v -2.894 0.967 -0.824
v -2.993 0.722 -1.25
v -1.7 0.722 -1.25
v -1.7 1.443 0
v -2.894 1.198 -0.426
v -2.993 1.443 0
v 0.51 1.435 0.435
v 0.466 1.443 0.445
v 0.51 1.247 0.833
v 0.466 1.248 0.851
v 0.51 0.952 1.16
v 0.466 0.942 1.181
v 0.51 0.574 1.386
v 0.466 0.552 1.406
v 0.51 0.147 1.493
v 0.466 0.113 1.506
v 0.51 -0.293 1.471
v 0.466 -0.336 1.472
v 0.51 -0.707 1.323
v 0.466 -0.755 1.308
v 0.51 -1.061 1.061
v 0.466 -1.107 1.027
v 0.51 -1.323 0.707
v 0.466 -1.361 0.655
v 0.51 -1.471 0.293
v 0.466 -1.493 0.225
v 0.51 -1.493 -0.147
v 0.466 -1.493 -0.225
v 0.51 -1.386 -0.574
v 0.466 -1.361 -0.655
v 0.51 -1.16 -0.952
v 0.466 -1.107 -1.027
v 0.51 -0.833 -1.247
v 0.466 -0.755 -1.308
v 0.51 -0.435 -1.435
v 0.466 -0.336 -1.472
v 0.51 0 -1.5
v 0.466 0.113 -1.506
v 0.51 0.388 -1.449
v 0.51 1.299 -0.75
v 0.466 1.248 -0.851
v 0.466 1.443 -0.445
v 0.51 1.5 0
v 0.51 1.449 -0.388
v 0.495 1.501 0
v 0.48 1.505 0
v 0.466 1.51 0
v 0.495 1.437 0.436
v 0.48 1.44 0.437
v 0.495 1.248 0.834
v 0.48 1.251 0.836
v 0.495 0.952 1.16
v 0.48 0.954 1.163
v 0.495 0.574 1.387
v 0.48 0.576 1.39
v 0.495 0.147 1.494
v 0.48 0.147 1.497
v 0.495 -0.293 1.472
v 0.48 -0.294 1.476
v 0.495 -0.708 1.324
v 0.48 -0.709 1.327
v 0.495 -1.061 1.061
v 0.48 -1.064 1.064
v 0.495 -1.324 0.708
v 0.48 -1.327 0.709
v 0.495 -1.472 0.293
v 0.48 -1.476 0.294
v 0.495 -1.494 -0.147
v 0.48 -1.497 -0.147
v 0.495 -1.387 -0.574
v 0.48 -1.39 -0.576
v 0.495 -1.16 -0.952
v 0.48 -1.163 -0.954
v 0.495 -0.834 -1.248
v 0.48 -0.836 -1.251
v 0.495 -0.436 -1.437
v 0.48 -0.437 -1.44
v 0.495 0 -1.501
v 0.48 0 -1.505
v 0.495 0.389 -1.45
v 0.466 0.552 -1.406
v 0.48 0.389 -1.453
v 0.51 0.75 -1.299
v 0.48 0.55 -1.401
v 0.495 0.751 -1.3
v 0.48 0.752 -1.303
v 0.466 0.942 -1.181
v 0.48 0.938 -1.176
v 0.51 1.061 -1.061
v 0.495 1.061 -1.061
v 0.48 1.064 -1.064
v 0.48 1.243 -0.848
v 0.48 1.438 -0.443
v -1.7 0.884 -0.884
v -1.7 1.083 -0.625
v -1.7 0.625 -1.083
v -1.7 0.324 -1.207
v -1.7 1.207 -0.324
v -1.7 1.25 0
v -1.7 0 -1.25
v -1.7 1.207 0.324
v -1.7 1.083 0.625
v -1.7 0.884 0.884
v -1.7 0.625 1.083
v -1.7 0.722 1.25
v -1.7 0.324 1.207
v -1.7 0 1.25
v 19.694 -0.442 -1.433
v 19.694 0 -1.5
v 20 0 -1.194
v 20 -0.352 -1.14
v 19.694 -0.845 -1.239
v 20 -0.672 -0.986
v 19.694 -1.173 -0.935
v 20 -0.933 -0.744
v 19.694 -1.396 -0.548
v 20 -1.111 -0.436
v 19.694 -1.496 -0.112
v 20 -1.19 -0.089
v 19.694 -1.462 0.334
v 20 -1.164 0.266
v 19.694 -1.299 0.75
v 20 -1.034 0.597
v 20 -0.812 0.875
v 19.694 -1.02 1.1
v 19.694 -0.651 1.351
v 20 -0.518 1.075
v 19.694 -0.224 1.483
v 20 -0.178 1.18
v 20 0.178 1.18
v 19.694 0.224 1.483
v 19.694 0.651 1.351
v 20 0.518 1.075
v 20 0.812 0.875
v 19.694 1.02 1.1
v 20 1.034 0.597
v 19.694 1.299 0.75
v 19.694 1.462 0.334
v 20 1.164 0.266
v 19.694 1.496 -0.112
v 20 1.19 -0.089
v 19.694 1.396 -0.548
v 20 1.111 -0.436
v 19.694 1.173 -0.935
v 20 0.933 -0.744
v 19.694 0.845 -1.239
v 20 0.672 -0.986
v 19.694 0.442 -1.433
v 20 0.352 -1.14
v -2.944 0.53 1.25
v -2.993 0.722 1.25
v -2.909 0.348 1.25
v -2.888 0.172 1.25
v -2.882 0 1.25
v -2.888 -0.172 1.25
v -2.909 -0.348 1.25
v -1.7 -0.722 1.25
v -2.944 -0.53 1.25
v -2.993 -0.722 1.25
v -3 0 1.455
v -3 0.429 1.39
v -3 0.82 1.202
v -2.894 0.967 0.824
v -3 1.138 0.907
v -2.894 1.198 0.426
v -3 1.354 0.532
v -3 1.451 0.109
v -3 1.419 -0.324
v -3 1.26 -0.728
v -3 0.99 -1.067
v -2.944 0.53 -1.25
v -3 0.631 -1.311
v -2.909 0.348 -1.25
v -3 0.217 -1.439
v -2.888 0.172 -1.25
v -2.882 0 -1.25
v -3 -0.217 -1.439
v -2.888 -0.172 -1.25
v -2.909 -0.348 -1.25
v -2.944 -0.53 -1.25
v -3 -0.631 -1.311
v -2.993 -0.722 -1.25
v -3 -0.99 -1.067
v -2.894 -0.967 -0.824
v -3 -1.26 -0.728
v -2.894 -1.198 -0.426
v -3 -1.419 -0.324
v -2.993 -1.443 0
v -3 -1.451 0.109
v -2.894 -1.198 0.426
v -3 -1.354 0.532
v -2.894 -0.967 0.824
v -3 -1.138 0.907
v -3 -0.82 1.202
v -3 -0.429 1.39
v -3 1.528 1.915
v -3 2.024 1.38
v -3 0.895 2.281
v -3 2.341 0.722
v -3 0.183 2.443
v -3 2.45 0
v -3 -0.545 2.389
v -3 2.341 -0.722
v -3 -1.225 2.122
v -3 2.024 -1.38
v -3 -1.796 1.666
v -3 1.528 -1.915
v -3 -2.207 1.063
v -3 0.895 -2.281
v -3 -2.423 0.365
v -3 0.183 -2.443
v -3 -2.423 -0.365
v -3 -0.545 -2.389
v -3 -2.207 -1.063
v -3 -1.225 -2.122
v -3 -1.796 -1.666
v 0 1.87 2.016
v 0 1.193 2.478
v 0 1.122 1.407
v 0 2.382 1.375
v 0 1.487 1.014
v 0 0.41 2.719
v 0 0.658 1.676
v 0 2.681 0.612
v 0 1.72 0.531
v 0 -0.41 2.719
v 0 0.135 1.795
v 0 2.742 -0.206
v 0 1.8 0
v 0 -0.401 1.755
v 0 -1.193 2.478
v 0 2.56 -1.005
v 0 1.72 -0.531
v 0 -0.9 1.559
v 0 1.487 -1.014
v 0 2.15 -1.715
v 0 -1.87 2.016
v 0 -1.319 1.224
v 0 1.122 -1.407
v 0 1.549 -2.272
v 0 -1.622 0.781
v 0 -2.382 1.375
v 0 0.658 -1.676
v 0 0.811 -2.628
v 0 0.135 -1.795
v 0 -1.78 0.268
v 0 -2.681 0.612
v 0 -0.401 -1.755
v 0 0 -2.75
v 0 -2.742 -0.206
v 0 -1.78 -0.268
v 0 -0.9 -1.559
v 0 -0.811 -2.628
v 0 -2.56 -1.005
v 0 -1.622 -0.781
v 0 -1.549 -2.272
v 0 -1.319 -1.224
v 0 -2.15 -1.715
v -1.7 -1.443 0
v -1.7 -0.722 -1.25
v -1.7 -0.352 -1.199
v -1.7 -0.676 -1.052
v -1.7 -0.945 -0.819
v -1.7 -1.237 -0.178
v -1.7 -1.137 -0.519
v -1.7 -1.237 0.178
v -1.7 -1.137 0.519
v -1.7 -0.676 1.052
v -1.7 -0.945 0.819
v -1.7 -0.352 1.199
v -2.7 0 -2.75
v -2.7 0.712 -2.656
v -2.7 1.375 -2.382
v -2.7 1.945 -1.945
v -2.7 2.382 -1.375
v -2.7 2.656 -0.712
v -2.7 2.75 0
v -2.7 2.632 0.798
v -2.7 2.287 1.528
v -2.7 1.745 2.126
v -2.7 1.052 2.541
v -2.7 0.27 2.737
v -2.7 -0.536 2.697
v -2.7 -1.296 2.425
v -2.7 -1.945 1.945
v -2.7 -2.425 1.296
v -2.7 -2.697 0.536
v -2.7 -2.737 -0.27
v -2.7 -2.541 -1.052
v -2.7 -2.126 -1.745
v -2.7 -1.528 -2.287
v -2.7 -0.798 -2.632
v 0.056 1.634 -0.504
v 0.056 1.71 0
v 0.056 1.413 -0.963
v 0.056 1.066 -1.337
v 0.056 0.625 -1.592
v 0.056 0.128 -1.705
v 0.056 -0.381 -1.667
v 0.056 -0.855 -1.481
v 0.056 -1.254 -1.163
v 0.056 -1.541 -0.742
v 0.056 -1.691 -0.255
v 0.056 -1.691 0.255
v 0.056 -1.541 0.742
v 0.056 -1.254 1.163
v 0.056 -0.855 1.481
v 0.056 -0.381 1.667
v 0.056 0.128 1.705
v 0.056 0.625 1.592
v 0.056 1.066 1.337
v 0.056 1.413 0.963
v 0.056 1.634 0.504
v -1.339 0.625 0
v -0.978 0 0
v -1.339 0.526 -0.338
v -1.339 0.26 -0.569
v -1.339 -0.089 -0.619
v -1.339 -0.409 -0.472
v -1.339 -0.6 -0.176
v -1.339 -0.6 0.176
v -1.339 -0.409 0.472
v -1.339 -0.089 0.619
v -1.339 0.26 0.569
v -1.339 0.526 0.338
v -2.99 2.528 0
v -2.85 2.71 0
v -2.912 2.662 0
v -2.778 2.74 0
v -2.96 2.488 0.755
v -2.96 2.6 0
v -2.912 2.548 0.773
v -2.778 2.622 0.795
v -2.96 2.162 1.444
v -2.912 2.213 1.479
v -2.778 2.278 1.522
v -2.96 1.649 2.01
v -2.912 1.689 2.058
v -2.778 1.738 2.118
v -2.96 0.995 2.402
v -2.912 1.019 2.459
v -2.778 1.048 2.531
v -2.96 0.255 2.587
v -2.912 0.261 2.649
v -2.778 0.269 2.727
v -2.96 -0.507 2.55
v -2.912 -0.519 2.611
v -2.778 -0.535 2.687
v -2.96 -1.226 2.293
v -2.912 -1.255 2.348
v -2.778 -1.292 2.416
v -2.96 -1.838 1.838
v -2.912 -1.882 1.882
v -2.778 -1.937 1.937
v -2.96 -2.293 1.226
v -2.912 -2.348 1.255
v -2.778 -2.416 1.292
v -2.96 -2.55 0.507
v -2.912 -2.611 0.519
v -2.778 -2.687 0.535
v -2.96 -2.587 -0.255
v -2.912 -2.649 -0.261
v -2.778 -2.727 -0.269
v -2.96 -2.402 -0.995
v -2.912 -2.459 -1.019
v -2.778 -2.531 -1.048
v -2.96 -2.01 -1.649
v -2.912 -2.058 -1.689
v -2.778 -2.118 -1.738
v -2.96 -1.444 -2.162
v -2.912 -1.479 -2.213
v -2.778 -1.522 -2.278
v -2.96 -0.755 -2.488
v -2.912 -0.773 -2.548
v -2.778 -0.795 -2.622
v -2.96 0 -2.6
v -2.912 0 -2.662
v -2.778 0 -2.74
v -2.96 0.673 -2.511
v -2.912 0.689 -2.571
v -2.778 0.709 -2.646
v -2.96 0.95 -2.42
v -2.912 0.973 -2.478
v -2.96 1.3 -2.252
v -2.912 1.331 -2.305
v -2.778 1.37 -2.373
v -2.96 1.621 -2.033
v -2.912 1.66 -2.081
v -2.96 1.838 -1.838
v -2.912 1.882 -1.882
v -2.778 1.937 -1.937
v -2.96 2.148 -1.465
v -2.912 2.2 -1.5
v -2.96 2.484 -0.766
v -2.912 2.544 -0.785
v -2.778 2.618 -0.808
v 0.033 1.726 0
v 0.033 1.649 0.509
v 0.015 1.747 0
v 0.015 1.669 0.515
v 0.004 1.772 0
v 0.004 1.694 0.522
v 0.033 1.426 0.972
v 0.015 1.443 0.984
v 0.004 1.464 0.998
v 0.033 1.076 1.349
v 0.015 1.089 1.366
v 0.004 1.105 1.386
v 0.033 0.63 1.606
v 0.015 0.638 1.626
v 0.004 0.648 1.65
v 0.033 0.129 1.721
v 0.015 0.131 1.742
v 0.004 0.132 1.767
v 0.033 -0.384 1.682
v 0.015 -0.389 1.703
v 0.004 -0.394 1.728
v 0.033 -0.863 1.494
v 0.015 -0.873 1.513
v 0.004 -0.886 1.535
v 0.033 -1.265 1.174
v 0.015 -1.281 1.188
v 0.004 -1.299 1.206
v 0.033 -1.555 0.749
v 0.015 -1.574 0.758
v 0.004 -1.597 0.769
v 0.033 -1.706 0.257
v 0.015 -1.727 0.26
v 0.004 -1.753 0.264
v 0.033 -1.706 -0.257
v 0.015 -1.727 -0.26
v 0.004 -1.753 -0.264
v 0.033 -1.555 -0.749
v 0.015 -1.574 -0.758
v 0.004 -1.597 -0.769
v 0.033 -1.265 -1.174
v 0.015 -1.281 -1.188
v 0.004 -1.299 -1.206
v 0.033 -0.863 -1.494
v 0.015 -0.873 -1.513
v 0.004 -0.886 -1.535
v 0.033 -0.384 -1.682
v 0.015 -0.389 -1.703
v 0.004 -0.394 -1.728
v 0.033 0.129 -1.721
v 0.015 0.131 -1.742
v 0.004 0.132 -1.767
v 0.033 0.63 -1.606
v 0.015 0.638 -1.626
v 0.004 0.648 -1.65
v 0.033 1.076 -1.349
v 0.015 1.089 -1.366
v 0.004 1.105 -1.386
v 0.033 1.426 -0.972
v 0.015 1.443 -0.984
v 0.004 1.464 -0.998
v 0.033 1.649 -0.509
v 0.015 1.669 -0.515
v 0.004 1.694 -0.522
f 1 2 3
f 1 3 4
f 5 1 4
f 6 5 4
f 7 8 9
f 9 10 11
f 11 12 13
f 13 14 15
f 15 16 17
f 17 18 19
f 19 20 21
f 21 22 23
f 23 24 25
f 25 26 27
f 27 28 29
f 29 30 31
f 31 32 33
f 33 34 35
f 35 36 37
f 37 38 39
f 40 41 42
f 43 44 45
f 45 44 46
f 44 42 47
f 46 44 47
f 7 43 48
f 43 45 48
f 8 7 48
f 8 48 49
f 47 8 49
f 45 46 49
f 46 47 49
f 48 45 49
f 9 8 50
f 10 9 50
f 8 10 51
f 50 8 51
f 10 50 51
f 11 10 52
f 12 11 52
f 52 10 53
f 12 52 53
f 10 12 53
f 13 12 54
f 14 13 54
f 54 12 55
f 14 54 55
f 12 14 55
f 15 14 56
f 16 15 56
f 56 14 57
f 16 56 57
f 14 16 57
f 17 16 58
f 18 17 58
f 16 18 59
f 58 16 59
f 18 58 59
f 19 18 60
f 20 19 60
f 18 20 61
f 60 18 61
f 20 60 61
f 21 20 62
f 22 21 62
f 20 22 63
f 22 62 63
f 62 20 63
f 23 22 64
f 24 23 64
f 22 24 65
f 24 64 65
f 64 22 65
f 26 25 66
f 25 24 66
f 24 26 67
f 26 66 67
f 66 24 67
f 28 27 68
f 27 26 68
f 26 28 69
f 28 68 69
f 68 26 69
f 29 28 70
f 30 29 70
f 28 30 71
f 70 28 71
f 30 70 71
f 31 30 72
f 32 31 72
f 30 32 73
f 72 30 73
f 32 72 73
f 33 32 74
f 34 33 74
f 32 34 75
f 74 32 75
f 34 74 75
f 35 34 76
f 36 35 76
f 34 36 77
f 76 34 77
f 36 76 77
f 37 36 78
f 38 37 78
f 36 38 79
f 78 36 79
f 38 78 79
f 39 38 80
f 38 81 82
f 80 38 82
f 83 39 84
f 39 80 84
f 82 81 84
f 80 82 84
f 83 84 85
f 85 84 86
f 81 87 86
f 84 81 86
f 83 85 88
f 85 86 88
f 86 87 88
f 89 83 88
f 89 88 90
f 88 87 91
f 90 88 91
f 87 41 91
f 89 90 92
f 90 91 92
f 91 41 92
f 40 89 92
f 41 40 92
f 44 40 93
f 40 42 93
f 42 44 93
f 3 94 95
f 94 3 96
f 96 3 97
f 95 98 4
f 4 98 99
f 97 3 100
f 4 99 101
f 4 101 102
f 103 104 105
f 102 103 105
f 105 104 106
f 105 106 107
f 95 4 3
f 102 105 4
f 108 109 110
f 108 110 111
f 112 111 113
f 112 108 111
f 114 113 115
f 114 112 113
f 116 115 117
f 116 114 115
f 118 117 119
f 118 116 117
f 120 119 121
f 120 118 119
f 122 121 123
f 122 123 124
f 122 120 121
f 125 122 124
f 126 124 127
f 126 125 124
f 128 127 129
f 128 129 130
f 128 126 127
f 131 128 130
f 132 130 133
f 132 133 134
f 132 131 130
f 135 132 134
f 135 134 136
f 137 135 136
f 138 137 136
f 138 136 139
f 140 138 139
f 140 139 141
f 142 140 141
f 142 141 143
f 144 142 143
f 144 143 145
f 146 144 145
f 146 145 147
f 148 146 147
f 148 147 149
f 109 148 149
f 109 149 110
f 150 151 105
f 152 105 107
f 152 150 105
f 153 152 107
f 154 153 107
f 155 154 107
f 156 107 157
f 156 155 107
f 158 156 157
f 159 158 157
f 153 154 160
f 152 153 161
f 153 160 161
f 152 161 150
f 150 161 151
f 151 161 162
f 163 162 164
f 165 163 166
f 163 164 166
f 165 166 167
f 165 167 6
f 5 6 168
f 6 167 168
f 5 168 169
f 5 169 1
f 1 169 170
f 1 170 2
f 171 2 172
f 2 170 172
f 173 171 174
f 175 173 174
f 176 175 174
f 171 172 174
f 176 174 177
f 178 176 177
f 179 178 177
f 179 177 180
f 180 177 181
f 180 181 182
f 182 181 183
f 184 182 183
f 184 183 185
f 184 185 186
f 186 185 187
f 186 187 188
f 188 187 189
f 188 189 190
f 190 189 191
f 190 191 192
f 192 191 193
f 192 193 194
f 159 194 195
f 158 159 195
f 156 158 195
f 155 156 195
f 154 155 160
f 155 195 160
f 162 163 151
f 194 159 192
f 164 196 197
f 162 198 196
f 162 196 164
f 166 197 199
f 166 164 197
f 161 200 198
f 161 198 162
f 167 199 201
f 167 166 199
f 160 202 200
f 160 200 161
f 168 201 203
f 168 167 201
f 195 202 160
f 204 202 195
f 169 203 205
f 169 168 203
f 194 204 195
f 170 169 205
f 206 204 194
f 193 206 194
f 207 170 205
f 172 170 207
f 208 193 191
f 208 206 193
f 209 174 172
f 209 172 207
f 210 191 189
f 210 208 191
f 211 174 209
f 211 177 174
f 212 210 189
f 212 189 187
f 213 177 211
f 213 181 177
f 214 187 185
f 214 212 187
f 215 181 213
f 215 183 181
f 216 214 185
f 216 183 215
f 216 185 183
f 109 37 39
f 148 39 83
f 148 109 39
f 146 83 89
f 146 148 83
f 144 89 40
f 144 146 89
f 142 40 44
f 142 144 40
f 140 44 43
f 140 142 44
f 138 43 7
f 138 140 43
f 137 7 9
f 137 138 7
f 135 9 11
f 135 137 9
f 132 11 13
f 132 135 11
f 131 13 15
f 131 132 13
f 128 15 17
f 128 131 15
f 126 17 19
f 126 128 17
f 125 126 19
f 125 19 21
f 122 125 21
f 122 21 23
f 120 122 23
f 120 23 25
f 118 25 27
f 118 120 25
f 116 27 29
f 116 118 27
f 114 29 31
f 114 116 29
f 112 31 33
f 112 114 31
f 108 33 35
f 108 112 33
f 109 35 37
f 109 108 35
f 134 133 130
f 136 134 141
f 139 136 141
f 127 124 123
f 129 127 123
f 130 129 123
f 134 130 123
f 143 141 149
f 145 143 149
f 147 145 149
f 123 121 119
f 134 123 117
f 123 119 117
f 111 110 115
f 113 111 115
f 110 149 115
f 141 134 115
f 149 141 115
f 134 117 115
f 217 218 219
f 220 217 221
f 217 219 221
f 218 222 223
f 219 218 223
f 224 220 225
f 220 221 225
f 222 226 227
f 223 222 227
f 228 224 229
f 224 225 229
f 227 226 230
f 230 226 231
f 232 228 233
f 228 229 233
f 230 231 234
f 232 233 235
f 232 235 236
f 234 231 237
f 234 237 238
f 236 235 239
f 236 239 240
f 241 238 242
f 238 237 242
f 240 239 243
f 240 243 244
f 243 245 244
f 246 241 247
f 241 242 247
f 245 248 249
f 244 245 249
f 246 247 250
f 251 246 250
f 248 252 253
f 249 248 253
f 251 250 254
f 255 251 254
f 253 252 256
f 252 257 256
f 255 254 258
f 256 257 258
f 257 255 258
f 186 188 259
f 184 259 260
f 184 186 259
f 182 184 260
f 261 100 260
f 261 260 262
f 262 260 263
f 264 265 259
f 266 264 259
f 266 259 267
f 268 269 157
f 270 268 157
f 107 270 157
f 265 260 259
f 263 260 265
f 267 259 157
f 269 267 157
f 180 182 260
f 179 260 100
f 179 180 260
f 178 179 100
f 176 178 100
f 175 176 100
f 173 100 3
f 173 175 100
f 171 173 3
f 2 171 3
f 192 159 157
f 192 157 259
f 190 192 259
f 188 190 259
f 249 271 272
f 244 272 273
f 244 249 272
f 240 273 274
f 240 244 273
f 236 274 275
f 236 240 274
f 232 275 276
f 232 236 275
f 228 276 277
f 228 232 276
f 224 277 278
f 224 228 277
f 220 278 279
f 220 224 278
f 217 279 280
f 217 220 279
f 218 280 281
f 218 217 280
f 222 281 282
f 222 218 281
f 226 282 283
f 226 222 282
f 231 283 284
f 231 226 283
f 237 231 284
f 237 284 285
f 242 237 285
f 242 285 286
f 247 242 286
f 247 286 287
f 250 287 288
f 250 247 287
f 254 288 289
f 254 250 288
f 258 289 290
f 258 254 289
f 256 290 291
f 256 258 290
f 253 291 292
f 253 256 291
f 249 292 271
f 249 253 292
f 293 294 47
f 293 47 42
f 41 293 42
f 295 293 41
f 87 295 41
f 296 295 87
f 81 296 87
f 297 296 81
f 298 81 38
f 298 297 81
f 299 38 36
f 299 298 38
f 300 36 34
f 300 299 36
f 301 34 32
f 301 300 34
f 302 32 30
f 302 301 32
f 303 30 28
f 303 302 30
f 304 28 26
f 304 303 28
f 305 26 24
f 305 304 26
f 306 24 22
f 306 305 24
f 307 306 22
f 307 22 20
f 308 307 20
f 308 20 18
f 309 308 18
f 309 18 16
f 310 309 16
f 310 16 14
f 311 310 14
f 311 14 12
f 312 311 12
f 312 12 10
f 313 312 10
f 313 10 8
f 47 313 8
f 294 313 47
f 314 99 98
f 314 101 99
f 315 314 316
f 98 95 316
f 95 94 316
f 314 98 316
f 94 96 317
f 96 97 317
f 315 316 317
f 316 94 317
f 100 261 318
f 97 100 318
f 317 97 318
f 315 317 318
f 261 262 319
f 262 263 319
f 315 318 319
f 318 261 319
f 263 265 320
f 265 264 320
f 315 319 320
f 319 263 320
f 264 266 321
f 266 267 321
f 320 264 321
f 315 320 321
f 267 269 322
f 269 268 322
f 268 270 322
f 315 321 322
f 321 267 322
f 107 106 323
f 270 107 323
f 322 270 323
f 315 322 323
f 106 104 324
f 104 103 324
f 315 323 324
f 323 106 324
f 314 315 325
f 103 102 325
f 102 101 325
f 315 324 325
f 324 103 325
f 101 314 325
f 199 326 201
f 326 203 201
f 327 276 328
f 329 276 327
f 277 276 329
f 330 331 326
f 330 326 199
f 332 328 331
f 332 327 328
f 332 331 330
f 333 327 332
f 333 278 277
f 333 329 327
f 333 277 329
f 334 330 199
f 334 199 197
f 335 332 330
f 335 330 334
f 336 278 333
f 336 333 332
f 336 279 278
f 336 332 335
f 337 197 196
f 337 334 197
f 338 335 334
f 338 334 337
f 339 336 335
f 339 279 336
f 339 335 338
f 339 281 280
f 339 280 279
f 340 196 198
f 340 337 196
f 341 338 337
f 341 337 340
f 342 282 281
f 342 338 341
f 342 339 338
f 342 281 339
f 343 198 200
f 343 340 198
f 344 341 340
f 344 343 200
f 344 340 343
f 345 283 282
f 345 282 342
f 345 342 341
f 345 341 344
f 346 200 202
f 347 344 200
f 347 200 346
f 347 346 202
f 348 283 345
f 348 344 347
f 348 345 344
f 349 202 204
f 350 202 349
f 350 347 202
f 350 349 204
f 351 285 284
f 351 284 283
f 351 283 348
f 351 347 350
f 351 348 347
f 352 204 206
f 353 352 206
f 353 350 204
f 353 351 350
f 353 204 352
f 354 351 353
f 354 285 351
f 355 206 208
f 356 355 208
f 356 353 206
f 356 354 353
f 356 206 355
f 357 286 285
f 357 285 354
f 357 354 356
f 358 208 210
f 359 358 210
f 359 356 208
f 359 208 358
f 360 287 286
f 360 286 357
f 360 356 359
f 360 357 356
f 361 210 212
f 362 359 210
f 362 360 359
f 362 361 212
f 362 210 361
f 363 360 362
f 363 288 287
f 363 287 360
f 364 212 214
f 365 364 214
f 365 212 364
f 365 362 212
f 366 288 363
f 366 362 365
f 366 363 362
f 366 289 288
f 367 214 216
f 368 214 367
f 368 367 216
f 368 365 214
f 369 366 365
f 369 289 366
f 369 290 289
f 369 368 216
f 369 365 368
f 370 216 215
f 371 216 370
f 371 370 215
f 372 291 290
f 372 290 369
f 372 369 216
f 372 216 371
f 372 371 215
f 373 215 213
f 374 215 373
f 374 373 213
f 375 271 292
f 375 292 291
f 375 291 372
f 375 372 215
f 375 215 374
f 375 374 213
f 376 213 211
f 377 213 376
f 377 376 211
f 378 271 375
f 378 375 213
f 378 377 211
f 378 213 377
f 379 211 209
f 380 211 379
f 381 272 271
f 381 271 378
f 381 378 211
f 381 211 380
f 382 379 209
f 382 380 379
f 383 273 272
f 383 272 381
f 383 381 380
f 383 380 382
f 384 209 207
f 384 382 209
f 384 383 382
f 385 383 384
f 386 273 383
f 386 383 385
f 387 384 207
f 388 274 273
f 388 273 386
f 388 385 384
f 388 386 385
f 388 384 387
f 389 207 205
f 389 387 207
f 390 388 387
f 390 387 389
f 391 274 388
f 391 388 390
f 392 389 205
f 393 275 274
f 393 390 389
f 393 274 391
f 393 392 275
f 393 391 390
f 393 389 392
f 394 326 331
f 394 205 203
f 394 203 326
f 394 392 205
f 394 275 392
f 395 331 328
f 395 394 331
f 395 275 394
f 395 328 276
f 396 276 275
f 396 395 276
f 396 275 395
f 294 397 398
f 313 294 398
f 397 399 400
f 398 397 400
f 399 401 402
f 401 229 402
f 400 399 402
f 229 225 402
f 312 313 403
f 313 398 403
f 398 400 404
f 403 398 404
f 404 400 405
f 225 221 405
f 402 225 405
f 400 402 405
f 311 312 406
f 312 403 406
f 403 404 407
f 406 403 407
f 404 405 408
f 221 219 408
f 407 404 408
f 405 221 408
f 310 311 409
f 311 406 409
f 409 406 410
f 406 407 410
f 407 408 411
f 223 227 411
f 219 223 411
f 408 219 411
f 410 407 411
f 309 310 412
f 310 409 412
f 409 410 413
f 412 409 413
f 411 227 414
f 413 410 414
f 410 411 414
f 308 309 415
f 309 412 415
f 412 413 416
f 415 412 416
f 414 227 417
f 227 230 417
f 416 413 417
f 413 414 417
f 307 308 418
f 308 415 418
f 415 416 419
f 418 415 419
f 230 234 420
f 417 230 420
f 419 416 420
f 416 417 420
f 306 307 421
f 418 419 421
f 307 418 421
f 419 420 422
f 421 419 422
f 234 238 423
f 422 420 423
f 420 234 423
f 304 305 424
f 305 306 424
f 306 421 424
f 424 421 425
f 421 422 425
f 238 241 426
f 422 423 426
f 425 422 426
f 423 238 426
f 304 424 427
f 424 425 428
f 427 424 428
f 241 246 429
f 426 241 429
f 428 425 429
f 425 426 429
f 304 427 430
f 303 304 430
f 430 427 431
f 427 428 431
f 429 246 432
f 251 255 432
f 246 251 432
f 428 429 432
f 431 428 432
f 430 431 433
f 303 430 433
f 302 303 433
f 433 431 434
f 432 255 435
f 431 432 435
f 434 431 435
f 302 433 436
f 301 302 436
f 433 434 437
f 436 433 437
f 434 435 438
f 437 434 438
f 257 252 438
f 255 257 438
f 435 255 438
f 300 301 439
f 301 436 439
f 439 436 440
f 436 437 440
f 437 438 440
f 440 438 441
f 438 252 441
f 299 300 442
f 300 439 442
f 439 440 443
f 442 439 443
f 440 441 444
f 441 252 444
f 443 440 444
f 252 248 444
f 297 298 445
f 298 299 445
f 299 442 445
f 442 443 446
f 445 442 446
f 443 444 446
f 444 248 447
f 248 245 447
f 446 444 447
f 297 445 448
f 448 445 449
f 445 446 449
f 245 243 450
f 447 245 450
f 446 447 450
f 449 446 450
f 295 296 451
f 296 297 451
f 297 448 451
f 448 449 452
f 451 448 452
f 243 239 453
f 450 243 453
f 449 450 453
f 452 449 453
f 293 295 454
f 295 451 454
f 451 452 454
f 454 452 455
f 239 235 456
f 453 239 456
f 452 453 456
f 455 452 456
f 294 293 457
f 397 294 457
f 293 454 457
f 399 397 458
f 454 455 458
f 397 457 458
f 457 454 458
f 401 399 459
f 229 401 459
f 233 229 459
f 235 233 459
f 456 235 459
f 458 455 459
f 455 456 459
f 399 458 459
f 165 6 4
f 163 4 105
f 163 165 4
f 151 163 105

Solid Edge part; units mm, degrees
sketch "Sketch1" plane through (0, 0, 0) normal (0, -1, 0) x (1, 0, 0)
  line L0 (-3, 0) -> (-3, -2.75)
  line L1 (-3, -2.75) -> (0, -2.75)
  line L2 (0, -2.75) -> (0, -1.5)
  line L3 (0, -1.5) -> (19.6935, -1.5)
  line L4 (19.6935, -1.5) -> (20, -1.1935)
  line L5 (20, -1.1935) -> (20, 0)
  line L6 (20, 0) -> (-3, 0)
revolve "RevolvedProtrusion1" add sketch "Sketch1" angle 360 about axis through (20, 0, 0) along (-1, 0, 0)
cosmetic_thread "Thread_1" size "M3" thread depth 18.5
sketch "Sketch2" plane through (0, 0, 0) normal (0, 0, 1) x (1, 0, 0)
  line L0 (0, 1.4) -> (0.51, 1.4)
  line L1 (0.51, 1.4) -> (0.51, 1.5)
  arc A0 (0.51, 1.5) -> (0.4662, 1.5101) centre (0.51, 1.6) cw
  line L2 (0.4662, 1.5101) -> (0, 1.7375)
  line L3 (0, 1.7375) -> (0, 1.4)
revolve "RevolvedProtrusion2" add sketch "Sketch2" angle 360 about axis through (0.51, 0, 0) along (-1, 0, 0)
sketch "Sketch3" plane through (0, 0, 0) normal (0, 0, 1) x (1, 0, 0)
  line L0 (0, 1.7101) -> (0.0562, 1.7101)
  arc A0 (0.0562, 1.7101) -> (0, 1.8) centre (0.1, 1.8) cw
  line L1 (0, 1.8) -> (0, 1.7101)
revolve "RevolvedProtrusion3" add sketch "Sketch3" angle 360 about axis through (20, 0, 0) along (-1, 0, 0)
hole "Hole_1" at (-3, 0, 0) direction (1, 0, 0) diameter 2.5 depth 1.3 countersink diameter 2.91 countersink angle 120
sketch "Sketch4" plane through (0, 0, 0) normal (0, 0, 1) x (1, 0, 0)
  line L0 (-3.1, 2.45) -> (-3, 2.45)
  arc A0 (-3, 2.45) -> (-2.7, 2.75) centre (-2.7, 2.45) cw
  line L1 (-2.7, 2.75) -> (-2.7, 2.85)
  line L2 (-2.7, 2.85) -> (-3.1, 2.85)
  line L3 (-3.1, 2.85) -> (-3.1, 2.45)
revolve "RevolvedCutout1" cut sketch "Sketch4" angle 360 about axis through (-2.7, 0, 0) along (-1, 0, 0)
sketch "Sketch5" plane through (-3, 0, 0) normal (1, 0, 0) x (0, 1, 0)
  line L0 (-0.7217, 1.25) -> (-1.4434, 0)
  line L1 (-1.4434, 0) -> (-0.7217, -1.25)
  line L2 (-0.7217, -1.25) -> (0.7217, -1.25)
  line L3 (0.7217, -1.25) -> (1.4434, 0)
  line L4 (1.4434, 0) -> (0.7217, 1.25)
  line L5 (0.7217, 1.25) -> (-0.7217, 1.25)
extrude "ExtrudedCutout_1" cut sketch "Sketch5" along normal blind 1.3
sketch "Sketch6" plane through (0, 0, 0) normal (0, 0, 1) x (1, 0, 0)
  line L0 (-1.7, 0) -> (-1.7, 1.25)
  line L1 (-1.7, 1.25) -> (-0.9783, 0)
  line L2 (-0.9783, 0) -> (-1.7, 0)
revolve "RevolvedCutout2" cut sketch "Sketch6" angle 360 about axis through (-0.9783, 0, 0) along (-1, 0, 0)
properties part number "Cylinder head screw DIN 912 M3x20 07065.030.020(High)"
